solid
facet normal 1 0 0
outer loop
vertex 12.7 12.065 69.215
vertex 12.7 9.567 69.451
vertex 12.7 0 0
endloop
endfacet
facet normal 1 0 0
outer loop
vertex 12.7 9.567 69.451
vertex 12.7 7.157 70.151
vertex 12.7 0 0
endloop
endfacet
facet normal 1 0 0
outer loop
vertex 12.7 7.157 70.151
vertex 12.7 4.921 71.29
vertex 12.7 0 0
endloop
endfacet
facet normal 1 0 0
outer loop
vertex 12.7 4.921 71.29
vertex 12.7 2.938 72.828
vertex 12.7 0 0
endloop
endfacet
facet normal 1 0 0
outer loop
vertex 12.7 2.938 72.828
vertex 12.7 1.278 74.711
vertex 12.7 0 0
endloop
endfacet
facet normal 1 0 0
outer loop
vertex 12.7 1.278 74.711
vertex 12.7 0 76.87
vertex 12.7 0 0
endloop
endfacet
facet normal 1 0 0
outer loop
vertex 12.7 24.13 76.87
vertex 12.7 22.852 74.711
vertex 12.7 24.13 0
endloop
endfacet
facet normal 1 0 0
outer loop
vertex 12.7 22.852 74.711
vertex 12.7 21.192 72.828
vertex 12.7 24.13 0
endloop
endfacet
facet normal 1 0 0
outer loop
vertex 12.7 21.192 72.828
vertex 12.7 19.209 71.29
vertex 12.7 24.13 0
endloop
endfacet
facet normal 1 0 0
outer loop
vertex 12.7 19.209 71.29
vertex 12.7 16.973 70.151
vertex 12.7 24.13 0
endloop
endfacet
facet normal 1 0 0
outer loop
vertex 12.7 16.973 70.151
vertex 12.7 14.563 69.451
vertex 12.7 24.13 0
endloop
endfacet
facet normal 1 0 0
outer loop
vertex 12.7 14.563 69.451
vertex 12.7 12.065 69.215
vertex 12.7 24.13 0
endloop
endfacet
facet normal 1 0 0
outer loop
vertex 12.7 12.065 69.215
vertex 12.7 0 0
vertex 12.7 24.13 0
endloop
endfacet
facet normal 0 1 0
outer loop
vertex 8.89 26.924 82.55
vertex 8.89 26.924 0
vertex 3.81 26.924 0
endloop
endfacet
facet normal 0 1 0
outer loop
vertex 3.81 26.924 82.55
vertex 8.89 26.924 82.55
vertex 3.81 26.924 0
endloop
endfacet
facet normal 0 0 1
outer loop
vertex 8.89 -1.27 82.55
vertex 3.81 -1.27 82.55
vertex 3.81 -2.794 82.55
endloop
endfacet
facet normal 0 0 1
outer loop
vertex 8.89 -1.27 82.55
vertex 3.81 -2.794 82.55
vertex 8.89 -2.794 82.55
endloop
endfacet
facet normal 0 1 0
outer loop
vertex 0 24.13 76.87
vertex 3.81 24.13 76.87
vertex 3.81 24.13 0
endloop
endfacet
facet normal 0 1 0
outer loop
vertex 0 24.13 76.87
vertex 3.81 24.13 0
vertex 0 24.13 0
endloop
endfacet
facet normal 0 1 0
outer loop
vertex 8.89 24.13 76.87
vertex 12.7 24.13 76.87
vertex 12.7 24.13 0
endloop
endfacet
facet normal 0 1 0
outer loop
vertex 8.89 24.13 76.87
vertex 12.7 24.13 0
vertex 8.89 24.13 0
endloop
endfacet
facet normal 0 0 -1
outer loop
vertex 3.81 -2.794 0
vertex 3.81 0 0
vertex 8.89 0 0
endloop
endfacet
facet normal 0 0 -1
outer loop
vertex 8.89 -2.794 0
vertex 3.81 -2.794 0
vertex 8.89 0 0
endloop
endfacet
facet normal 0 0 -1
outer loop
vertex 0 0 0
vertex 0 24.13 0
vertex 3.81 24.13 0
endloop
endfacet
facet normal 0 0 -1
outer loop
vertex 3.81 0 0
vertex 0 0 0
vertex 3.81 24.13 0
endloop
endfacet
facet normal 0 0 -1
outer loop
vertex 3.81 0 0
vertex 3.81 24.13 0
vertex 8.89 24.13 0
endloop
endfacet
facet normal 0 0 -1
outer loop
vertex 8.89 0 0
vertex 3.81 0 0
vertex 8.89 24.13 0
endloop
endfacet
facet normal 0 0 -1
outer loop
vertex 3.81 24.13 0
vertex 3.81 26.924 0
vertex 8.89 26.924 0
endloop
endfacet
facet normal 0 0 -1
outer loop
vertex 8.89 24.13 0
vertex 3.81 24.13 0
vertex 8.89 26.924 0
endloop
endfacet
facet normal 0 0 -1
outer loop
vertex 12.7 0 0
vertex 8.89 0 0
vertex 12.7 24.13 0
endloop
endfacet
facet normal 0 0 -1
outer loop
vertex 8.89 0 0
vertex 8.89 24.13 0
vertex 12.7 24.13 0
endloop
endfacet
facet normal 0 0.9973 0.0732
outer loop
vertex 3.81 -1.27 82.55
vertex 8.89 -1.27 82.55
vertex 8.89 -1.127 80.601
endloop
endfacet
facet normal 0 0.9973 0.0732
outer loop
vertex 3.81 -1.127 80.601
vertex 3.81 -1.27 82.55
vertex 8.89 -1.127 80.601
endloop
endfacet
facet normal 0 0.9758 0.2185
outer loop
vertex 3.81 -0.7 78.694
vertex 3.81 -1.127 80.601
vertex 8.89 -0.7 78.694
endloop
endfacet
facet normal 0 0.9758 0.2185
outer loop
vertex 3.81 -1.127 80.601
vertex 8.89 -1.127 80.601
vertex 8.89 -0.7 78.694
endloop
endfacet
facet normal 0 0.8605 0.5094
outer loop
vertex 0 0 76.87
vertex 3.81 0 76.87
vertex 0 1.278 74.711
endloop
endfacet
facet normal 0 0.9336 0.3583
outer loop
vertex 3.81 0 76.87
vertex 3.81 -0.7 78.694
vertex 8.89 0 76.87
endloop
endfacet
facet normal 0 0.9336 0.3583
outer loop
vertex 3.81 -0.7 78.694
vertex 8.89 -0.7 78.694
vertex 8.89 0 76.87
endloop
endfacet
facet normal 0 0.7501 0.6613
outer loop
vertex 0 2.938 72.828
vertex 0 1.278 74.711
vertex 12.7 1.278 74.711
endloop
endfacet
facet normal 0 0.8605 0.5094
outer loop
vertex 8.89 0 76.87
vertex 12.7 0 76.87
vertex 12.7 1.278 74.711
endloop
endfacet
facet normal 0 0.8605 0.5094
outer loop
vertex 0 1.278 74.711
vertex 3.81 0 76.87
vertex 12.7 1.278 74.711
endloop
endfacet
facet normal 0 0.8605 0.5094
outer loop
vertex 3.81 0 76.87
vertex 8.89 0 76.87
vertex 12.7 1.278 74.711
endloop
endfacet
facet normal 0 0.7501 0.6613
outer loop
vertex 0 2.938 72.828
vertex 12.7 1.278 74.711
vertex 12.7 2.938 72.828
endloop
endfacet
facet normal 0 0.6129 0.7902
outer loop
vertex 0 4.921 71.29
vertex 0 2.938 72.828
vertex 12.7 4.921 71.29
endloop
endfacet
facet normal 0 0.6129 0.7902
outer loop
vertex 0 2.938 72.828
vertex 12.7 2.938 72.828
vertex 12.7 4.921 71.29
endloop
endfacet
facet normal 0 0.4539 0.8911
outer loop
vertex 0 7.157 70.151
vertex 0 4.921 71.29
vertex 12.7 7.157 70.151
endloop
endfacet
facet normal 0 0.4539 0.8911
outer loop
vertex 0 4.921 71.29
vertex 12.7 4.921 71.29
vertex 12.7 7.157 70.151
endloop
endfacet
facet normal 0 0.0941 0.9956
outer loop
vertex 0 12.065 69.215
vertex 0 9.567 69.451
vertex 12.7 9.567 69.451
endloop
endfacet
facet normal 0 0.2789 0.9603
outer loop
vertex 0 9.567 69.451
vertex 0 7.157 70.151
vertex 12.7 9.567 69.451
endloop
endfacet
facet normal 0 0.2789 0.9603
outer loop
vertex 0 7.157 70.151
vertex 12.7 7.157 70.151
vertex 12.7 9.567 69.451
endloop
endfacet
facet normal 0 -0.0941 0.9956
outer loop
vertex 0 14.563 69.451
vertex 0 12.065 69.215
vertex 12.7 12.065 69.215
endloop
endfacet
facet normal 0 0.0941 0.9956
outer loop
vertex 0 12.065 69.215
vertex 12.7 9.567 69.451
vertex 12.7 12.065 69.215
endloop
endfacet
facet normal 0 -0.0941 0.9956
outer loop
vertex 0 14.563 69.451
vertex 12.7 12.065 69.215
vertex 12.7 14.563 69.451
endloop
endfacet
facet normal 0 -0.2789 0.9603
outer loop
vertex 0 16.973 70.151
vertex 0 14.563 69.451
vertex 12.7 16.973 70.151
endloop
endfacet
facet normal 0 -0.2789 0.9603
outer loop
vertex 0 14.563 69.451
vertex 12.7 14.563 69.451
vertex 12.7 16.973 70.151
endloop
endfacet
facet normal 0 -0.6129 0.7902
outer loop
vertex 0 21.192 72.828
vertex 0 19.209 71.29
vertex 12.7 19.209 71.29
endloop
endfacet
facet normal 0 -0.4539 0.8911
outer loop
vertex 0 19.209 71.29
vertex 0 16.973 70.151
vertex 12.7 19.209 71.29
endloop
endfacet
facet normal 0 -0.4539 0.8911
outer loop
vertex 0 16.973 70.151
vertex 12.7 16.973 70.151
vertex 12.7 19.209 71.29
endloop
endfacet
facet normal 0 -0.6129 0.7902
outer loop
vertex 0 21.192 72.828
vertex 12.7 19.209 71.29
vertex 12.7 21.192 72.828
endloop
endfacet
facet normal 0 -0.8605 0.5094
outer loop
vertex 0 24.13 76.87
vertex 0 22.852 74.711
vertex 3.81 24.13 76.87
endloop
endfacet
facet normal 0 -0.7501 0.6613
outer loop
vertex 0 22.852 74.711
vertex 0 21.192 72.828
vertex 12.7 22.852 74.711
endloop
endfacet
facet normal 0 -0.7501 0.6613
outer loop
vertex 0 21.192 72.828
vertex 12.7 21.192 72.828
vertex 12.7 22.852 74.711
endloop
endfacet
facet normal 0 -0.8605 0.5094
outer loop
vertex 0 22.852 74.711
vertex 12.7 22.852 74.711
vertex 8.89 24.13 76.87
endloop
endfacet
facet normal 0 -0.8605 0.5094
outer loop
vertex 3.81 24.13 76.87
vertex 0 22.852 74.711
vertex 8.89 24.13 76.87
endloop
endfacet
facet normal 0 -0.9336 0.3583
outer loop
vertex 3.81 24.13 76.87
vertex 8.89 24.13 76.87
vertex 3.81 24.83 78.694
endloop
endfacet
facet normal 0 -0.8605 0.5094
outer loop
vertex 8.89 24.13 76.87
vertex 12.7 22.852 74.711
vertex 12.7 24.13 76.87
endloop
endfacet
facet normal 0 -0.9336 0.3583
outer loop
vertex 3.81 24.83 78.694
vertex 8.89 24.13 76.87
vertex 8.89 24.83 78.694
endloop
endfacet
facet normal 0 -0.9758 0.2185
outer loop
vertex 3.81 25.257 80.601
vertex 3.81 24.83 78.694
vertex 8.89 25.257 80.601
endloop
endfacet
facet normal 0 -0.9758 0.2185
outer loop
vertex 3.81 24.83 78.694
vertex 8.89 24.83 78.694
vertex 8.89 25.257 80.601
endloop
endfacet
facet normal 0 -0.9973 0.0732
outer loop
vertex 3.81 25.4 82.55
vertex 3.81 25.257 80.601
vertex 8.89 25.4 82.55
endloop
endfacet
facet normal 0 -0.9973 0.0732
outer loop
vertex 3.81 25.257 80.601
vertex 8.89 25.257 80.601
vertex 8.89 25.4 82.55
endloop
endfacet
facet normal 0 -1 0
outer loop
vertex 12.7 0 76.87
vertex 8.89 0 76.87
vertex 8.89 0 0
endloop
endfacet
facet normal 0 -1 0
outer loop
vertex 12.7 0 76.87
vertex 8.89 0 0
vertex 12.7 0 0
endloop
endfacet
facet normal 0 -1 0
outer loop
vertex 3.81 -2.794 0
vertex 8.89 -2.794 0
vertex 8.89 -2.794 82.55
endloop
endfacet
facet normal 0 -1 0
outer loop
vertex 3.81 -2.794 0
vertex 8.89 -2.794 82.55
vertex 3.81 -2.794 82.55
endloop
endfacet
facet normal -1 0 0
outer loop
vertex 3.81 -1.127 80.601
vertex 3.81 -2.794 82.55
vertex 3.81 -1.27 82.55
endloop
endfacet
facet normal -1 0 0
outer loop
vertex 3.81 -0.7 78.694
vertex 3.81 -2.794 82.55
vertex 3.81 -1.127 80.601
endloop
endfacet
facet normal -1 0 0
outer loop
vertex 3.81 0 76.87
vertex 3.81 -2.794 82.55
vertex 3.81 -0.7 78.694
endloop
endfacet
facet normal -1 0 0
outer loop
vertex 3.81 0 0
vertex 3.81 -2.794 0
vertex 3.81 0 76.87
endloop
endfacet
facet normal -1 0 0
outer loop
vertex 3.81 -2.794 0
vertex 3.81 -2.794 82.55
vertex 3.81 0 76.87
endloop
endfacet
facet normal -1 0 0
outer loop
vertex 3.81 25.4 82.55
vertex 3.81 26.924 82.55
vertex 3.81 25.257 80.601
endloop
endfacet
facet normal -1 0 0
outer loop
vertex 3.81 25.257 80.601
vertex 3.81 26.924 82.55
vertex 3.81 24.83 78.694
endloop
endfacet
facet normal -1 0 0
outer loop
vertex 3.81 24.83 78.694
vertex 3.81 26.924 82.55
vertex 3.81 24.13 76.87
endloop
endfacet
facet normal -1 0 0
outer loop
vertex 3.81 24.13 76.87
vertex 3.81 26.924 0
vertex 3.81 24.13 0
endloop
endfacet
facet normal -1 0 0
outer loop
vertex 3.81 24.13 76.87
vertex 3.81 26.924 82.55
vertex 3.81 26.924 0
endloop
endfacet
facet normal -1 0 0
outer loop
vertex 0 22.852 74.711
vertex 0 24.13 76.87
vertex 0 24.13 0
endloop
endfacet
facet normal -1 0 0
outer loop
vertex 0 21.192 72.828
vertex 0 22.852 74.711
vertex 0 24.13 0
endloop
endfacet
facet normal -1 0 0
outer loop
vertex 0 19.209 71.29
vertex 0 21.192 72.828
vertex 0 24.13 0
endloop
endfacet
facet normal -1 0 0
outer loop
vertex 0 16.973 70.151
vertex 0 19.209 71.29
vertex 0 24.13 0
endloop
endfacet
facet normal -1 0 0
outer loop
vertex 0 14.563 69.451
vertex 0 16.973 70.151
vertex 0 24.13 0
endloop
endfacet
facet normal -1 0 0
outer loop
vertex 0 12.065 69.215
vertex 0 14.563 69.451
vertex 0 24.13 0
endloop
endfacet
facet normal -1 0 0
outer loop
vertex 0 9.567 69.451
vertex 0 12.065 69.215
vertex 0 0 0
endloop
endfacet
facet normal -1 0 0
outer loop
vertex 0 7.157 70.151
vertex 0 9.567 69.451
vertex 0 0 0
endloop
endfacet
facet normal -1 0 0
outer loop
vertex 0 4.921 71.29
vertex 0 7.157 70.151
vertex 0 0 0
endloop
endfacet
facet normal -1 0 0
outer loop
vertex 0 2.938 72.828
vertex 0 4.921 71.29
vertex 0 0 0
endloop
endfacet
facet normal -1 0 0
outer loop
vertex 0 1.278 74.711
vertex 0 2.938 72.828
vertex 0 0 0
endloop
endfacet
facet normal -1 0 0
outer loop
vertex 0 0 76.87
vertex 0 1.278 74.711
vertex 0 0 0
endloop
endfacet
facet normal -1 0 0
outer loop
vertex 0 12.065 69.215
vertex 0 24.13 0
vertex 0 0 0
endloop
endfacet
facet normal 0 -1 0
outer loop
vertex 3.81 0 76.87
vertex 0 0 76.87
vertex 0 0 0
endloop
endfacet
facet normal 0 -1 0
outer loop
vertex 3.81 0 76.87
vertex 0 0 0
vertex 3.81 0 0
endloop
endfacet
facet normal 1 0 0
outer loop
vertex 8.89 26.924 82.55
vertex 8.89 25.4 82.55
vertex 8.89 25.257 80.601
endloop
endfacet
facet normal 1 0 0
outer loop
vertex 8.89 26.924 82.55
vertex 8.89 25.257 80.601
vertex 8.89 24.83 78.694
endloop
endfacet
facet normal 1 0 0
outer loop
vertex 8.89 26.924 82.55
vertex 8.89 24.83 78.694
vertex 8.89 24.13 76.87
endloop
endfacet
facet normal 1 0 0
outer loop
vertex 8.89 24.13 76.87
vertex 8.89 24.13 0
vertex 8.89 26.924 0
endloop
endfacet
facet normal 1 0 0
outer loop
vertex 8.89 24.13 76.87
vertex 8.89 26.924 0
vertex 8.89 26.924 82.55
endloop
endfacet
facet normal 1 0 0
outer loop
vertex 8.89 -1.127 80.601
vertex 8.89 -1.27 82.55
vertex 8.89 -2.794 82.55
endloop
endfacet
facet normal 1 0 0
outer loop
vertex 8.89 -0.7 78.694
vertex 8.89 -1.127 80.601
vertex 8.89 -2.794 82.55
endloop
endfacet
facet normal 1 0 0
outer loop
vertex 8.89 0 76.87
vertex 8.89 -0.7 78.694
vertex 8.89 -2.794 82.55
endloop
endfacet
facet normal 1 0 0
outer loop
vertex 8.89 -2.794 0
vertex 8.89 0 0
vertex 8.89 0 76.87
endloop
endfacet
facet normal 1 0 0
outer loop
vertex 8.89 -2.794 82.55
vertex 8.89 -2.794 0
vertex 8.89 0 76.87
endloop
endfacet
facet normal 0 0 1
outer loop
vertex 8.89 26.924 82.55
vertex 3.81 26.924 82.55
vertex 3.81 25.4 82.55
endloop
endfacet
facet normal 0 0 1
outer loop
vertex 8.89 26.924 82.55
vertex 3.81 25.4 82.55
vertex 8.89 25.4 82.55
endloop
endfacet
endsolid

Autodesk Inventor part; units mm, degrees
ref_plane "YZ Plane" through (0, 0, 0) normal (1, 0, 0) x (0, 1, 0)
ref_plane "XZ Plane" through (0, 0, 0) normal (0, 1, 0) x (-1, 0, 0)
ref_plane "XY Plane" through (0, 0, 0) normal (0, 0, 1) x (1, 0, 0)
sketch "Sketch1" plane through (0, 0, 0) normal (0, 0, 1) x (1, 0, 0)
  line L0 (12.7, 0) -> (12.7, 24.13)
  line L1 (0, 24.13) -> (0, 0)
  line L2 (3.81, 24.13) -> (8.89, 24.13)
  line L3 (8.89, 24.13) -> (8.89, 26.924)
  line L4 (8.89, 26.924) -> (3.81, 26.924)
  line L5 (3.81, 26.924) -> (3.81, 24.13)
  line L6 (3.81, 0) -> (8.89, 0)
  line L7 (8.89, 0) -> (8.89, -2.794)
  line L8 (8.89, -2.794) -> (3.81, -2.794)
  line L9 (3.81, -2.794) -> (3.81, 0)
  line L10 (12.7, 24.13) -> (8.89, 24.13)
  line L11 (3.81, 24.13) -> (0, 24.13)
  line L12 (0, 0) -> (3.81, 0)
  line L13 (8.89, 0) -> (12.7, 0)
  line L14 (-1.7824, 25.8737) -> (3.334, 25.8737)
  line L15 (3.334, 25.8737) -> (3.334, 28.6416)
  line L16 (3.334, 28.6416) -> (9.4568, 28.6416)
  line L17 (9.4568, 28.6416) -> (9.4568, 25.8737)
  line L18 (9.4568, 25.8737) -> (14.3215, 25.8737)
  dimension "d0" = 12.7
  dimension "d1" = 24.13
  dimension "d2" = 5.08
  dimension "d3" = 2.794
  dimension "d4" = 3.81
  dimension "d5" = 5.08
  dimension "d6" = 2.794
  dimension "d7" = 3.81
extrude "Extrusion1" add sketch "Sketch1" along normal blind 82.55
sketch "Sketch2" plane through (12.7, 0, 0) normal (1, 0, 0) x (0, 0, -1)
  line L0 (-82.55, 24.13) -> (-82.55, 0) projected
  circle A0 centre (-82.55, 12.065) radius 13.335
  point P0 (0, 0)
  dimension "d10" = 26.67
extrude "Extrusion2" cut sketch "Sketch2" against normal blind 82.55
properties part number "EngineClip"
